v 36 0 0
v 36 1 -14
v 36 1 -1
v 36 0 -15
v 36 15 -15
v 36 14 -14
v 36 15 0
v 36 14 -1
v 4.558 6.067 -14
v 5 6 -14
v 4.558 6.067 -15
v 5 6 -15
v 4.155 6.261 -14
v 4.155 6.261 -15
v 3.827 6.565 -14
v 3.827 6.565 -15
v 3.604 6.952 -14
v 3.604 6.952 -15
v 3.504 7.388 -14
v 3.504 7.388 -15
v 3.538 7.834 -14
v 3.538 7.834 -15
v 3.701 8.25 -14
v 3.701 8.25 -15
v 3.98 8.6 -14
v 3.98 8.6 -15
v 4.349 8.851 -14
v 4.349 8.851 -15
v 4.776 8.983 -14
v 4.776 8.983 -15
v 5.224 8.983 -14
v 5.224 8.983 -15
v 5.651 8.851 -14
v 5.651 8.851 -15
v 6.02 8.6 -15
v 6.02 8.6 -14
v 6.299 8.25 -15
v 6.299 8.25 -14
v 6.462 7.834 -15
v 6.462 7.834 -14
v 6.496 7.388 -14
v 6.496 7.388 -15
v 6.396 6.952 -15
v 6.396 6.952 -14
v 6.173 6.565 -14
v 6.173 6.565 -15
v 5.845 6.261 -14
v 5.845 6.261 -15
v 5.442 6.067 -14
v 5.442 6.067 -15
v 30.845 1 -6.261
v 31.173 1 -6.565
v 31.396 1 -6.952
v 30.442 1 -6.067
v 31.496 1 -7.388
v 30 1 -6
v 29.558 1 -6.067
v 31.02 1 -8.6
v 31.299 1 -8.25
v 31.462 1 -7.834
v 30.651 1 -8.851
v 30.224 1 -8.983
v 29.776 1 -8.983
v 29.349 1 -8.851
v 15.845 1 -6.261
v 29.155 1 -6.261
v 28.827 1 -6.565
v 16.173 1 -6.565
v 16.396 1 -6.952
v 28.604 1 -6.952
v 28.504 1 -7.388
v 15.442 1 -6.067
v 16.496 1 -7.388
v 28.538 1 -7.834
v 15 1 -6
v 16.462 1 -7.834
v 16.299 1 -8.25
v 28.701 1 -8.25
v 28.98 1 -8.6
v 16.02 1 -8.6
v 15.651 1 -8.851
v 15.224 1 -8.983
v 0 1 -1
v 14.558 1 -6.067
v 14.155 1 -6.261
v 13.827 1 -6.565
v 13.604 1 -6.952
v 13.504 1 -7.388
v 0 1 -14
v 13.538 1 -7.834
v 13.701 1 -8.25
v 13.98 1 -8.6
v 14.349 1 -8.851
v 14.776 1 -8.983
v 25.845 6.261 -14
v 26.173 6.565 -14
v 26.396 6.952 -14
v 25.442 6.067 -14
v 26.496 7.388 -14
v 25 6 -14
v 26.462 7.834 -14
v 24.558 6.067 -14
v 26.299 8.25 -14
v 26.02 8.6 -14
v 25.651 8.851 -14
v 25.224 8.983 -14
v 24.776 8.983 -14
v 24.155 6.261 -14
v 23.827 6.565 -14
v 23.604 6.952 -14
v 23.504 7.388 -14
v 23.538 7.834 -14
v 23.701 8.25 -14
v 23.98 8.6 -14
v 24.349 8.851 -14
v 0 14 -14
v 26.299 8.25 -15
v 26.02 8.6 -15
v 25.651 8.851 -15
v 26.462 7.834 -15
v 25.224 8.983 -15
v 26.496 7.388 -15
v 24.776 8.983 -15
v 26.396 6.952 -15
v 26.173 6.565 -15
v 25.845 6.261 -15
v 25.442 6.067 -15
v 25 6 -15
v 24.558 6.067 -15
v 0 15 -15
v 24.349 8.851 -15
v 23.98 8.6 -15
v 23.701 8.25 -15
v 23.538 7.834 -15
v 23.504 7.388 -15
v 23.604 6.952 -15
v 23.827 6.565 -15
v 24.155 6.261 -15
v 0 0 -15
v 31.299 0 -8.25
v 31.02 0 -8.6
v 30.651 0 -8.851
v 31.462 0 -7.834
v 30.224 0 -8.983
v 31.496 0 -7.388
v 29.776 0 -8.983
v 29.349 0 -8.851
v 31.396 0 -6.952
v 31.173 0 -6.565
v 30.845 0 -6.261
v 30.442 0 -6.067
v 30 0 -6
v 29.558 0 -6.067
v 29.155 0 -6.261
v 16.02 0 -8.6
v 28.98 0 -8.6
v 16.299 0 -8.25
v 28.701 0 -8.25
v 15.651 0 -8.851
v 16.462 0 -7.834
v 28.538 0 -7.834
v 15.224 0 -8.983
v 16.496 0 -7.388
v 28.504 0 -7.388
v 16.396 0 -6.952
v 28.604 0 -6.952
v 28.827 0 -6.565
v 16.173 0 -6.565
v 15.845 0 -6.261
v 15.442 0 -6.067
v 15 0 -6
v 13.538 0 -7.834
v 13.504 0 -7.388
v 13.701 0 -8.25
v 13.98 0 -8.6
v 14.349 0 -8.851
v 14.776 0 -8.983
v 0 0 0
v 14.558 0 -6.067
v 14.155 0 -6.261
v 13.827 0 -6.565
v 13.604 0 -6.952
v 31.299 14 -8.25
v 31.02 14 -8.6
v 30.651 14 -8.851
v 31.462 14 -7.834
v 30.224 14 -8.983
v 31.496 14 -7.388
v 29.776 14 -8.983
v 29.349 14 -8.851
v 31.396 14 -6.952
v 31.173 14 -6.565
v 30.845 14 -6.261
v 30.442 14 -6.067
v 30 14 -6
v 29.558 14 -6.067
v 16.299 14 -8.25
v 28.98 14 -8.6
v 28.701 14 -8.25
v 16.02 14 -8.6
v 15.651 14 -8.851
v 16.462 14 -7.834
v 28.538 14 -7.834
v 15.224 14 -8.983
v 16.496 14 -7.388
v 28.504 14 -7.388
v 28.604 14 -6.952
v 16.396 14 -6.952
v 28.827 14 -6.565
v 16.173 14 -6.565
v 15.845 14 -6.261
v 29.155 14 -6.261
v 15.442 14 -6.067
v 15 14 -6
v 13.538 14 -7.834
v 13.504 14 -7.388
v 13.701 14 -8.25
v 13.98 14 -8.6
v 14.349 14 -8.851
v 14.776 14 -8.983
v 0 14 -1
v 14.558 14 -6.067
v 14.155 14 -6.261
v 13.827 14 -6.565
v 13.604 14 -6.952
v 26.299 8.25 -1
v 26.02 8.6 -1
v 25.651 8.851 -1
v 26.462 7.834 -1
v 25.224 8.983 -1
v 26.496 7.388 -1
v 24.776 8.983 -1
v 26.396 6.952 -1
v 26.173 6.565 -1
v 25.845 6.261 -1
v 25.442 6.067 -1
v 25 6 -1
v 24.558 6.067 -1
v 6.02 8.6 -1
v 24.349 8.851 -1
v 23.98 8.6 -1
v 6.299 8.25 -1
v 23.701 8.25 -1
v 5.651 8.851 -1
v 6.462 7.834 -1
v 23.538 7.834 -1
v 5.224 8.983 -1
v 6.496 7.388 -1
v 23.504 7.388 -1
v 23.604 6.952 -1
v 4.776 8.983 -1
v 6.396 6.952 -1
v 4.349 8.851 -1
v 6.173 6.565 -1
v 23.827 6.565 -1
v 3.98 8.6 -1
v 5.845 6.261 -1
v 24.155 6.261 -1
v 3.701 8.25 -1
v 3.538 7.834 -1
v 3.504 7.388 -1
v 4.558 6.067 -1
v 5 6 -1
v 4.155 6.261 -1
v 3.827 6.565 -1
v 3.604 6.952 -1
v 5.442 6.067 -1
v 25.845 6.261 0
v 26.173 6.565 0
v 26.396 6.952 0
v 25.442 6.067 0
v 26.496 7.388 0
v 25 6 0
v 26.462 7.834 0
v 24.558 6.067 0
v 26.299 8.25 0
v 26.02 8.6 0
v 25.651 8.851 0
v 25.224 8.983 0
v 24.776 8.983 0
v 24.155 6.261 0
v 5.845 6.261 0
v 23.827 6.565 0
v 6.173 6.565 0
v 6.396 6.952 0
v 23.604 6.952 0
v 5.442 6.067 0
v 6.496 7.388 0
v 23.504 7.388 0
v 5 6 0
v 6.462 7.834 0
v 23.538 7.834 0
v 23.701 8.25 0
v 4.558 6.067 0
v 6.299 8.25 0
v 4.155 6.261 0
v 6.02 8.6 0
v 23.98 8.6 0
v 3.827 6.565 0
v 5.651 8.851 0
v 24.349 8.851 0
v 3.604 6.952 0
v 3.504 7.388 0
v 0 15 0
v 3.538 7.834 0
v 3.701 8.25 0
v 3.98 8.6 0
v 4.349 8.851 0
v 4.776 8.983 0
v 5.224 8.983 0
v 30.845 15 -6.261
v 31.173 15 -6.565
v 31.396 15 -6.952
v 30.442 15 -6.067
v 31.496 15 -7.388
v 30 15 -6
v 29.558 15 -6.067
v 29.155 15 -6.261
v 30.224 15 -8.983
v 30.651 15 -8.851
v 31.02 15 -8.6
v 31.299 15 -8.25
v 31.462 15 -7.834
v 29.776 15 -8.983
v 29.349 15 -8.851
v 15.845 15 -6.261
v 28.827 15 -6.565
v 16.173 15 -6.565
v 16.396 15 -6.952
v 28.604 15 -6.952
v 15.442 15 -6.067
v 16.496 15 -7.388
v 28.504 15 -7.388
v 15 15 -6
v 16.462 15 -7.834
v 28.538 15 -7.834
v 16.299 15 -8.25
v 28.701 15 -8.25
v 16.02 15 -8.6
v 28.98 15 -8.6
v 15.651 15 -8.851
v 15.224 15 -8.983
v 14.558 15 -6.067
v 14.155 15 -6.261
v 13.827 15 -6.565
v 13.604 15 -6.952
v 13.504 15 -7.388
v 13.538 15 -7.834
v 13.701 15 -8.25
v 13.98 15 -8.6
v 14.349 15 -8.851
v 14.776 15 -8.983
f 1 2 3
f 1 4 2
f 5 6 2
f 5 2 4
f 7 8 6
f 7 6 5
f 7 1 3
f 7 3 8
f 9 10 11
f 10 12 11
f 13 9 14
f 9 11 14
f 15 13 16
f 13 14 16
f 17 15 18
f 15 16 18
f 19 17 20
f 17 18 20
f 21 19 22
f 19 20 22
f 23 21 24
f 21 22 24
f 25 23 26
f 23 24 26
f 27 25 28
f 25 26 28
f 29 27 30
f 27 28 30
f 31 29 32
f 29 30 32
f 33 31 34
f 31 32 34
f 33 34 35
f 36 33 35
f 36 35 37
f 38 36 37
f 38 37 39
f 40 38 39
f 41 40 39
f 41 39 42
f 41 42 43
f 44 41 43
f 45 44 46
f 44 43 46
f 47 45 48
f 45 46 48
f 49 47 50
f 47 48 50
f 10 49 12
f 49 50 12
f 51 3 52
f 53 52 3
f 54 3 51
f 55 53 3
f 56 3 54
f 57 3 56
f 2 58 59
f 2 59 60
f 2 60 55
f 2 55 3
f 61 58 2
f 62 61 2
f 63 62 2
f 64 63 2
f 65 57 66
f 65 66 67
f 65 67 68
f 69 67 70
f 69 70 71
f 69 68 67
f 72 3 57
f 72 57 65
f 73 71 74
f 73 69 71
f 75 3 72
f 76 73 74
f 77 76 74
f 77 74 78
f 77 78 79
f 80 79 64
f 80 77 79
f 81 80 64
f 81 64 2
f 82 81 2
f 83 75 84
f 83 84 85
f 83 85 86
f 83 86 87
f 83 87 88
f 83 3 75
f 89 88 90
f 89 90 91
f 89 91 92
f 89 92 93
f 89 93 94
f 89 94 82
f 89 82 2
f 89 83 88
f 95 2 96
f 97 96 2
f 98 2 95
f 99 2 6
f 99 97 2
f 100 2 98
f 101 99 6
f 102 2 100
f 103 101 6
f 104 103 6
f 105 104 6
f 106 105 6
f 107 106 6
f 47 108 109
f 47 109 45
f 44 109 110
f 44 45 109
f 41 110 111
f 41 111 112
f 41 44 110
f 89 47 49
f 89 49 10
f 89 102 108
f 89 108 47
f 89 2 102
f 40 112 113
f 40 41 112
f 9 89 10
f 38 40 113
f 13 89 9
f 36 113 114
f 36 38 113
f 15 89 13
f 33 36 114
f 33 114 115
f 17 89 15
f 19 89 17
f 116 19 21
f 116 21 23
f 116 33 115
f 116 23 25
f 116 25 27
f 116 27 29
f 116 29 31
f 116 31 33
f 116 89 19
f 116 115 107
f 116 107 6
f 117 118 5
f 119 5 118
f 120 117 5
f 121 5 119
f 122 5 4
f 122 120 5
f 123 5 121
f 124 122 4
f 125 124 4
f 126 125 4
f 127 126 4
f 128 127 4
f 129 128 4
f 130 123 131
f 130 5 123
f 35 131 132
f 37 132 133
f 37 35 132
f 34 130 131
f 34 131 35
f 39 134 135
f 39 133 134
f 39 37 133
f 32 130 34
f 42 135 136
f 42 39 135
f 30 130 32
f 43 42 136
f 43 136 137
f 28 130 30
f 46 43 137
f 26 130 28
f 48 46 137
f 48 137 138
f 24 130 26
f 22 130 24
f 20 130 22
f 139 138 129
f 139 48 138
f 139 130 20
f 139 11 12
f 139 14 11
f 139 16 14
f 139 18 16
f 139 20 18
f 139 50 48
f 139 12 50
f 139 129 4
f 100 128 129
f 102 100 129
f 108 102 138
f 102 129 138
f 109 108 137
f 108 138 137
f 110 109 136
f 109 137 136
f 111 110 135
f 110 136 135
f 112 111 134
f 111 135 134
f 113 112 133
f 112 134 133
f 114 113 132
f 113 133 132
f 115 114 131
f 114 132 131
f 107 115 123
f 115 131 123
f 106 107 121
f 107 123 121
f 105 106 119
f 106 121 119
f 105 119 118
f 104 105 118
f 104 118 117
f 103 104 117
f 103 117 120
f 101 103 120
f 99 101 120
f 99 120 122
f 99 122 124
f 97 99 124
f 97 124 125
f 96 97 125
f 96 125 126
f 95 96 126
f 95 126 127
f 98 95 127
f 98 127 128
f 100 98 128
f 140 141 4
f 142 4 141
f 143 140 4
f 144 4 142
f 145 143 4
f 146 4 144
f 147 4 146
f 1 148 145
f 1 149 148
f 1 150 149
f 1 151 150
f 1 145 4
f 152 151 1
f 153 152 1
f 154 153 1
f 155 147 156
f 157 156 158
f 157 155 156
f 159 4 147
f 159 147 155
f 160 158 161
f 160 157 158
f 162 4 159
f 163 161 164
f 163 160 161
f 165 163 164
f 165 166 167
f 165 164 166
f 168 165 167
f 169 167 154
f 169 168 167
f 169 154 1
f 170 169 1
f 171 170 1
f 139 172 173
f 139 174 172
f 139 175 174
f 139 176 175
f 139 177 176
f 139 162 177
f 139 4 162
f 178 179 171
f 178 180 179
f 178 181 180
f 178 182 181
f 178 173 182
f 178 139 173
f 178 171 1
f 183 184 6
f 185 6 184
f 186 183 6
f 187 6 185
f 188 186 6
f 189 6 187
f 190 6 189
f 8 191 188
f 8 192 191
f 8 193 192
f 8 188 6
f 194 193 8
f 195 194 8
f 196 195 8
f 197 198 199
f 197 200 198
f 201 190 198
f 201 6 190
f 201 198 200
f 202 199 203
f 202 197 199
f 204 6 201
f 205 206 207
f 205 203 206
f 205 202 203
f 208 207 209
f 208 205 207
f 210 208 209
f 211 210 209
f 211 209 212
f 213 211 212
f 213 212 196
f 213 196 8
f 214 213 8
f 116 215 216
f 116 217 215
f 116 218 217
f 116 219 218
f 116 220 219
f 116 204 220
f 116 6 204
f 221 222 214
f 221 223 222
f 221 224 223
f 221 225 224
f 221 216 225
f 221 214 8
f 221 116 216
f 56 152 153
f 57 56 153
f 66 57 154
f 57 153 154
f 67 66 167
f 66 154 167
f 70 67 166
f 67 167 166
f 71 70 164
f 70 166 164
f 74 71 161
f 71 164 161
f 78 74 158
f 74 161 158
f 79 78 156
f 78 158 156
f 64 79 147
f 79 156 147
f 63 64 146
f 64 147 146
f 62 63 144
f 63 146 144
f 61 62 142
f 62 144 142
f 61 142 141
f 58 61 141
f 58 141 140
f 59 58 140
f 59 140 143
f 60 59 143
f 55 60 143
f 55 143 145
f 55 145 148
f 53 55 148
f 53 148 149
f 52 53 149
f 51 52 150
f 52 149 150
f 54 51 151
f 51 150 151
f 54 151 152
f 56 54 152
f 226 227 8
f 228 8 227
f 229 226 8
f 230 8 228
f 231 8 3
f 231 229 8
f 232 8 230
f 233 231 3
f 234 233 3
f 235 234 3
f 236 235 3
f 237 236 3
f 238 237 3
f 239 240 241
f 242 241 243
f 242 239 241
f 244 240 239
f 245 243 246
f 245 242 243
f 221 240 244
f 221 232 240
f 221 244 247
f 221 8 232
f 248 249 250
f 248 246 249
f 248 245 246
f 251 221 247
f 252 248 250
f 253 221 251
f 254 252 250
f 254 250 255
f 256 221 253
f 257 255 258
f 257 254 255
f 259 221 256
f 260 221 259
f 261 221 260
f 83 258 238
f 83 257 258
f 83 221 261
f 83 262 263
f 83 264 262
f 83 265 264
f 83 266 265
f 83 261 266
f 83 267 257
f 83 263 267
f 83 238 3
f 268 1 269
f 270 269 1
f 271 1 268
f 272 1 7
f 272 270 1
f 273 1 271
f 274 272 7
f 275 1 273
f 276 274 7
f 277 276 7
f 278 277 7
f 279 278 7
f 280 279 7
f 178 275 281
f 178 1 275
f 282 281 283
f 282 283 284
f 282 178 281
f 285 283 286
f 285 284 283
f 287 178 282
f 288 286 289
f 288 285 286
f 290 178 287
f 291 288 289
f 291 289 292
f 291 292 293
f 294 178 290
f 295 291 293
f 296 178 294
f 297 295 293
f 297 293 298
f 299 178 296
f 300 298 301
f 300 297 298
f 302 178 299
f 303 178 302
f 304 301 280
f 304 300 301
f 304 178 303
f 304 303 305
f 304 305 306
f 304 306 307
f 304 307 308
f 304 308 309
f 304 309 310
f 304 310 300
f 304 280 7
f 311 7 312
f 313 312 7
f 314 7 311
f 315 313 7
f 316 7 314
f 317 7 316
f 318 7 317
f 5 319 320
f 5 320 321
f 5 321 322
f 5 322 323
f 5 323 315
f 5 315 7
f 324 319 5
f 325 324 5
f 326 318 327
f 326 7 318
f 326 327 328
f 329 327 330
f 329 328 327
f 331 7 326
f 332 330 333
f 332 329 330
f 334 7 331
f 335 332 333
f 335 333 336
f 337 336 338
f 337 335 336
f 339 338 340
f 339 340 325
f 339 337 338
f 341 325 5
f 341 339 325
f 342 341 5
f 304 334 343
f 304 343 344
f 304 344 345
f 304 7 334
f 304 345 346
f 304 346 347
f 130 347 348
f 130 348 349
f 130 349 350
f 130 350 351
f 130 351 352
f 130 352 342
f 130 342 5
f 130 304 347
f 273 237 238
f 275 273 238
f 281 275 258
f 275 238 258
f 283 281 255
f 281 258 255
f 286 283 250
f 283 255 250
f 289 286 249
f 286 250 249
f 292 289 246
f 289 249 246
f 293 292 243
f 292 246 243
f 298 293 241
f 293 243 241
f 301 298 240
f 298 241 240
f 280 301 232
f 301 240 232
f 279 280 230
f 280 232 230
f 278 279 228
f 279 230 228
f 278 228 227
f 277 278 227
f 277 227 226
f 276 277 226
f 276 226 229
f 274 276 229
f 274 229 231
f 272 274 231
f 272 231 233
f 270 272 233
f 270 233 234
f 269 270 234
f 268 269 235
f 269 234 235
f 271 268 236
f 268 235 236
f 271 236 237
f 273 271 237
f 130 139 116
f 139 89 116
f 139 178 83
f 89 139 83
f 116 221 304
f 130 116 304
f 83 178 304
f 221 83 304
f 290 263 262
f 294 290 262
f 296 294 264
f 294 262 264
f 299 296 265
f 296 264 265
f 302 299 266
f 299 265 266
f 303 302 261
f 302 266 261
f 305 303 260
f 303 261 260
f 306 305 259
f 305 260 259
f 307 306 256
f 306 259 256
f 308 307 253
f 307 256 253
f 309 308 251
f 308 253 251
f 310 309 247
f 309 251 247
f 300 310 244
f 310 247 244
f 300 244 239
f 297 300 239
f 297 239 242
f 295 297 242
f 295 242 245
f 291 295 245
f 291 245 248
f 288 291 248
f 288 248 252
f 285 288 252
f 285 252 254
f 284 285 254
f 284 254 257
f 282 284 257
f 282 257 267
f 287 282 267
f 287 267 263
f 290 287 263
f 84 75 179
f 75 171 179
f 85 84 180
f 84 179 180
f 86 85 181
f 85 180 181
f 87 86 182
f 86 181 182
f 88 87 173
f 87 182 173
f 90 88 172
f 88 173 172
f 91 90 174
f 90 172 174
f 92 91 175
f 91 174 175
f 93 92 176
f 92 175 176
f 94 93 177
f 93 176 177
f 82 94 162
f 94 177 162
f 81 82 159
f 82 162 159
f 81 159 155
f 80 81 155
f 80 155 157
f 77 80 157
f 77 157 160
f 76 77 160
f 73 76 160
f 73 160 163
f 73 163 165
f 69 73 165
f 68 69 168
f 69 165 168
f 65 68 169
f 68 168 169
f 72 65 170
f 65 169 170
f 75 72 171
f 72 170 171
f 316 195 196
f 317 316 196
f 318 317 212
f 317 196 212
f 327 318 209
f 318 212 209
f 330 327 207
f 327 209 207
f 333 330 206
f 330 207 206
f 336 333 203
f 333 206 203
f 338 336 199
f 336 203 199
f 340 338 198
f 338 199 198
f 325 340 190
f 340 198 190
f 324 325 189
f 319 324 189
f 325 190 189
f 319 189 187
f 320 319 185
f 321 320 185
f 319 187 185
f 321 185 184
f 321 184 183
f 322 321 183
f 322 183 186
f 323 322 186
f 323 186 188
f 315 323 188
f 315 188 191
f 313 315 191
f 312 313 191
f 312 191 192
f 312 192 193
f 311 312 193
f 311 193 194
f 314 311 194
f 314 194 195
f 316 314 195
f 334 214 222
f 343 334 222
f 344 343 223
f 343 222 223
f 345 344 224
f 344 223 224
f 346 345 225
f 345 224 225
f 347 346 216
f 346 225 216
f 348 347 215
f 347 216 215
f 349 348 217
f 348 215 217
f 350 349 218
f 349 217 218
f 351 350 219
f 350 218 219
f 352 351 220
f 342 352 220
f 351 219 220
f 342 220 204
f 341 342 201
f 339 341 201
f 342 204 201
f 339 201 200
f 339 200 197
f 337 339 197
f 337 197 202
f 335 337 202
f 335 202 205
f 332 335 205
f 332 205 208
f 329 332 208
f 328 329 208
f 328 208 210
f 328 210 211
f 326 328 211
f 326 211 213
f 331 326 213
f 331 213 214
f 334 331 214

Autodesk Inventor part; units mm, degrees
ref_plane "YZ Plane" through (0, 0, 0) normal (1, 0, 0) x (0, 1, 0)
ref_plane "XZ Plane" through (0, 0, 0) normal (0, 1, 0) x (-1, 0, 0)
ref_plane "XY Plane" through (0, 0, 0) normal (0, 0, 1) x (1, 0, 0)
sketch "スケッチ1" plane through (0, 0, 0) normal (1, 0, 0) x (0, 1, 0)
  line L0 (0, 0) -> (15, 0)
  line L1 (15, 0) -> (15, -15)
  line L2 (15, -15) -> (0, -15)
  line L3 (0, -15) -> (0, 0)
  line L4 (14, -14) -> (14, -1)
  line L5 (14, -1) -> (1, -1)
  line L6 (1, -1) -> (1, -14)
  line L7 (1, -14) -> (14, -14)
  dimension "d0" = 15
  dimension "d1" = 15
  dimension "d2" = 1
extrude "押し出し1" add sketch "スケッチ1" along normal blind 36
sketch "スケッチ2" plane through (0, 0, 0) normal (0, 0, 1) x (1, 0, 0)
  line L0 (0, 15) -> (0, 0) projected
  line L1 (0, 0) -> (36, 0) projected
  point P0 (5, 7.5)
  point P1 (25, 7.5)
  dimension "d5" = 5
  dimension "d6" = 20
  dimension "d7" = 7.5
  dimension "d8" = 7.5
sketch "スケッチ3" plane through (0, 15, 0) normal (0, 1, 0) x (1, 0, 0)
  line L0 (0, 15) -> (0, 0) projected
  line L1 (0, 0) -> (36, 0) projected
  point P0 (15, 7.5)
  point P1 (30, 7.5)
  dimension "d9" = 15
  dimension "d10" = 15
  dimension "d11" = 7.5
  dimension "d12" = 7.5
hole "穴1" at (5, 7.5, 0) at (25, 7.5, 0) direction (0, 0, -1) diameter 3 end through all
hole "穴2" at (15, 15, -7.5) at (30, 15, -7.5) direction (0, -1, 0) diameter 3 end through all
equation "\"d8\" = d7"
equation "\"d12\" = d11"
properties part number "hand-grab-v2-ASP-arm-F-1" material "アルミニウム 6061"
